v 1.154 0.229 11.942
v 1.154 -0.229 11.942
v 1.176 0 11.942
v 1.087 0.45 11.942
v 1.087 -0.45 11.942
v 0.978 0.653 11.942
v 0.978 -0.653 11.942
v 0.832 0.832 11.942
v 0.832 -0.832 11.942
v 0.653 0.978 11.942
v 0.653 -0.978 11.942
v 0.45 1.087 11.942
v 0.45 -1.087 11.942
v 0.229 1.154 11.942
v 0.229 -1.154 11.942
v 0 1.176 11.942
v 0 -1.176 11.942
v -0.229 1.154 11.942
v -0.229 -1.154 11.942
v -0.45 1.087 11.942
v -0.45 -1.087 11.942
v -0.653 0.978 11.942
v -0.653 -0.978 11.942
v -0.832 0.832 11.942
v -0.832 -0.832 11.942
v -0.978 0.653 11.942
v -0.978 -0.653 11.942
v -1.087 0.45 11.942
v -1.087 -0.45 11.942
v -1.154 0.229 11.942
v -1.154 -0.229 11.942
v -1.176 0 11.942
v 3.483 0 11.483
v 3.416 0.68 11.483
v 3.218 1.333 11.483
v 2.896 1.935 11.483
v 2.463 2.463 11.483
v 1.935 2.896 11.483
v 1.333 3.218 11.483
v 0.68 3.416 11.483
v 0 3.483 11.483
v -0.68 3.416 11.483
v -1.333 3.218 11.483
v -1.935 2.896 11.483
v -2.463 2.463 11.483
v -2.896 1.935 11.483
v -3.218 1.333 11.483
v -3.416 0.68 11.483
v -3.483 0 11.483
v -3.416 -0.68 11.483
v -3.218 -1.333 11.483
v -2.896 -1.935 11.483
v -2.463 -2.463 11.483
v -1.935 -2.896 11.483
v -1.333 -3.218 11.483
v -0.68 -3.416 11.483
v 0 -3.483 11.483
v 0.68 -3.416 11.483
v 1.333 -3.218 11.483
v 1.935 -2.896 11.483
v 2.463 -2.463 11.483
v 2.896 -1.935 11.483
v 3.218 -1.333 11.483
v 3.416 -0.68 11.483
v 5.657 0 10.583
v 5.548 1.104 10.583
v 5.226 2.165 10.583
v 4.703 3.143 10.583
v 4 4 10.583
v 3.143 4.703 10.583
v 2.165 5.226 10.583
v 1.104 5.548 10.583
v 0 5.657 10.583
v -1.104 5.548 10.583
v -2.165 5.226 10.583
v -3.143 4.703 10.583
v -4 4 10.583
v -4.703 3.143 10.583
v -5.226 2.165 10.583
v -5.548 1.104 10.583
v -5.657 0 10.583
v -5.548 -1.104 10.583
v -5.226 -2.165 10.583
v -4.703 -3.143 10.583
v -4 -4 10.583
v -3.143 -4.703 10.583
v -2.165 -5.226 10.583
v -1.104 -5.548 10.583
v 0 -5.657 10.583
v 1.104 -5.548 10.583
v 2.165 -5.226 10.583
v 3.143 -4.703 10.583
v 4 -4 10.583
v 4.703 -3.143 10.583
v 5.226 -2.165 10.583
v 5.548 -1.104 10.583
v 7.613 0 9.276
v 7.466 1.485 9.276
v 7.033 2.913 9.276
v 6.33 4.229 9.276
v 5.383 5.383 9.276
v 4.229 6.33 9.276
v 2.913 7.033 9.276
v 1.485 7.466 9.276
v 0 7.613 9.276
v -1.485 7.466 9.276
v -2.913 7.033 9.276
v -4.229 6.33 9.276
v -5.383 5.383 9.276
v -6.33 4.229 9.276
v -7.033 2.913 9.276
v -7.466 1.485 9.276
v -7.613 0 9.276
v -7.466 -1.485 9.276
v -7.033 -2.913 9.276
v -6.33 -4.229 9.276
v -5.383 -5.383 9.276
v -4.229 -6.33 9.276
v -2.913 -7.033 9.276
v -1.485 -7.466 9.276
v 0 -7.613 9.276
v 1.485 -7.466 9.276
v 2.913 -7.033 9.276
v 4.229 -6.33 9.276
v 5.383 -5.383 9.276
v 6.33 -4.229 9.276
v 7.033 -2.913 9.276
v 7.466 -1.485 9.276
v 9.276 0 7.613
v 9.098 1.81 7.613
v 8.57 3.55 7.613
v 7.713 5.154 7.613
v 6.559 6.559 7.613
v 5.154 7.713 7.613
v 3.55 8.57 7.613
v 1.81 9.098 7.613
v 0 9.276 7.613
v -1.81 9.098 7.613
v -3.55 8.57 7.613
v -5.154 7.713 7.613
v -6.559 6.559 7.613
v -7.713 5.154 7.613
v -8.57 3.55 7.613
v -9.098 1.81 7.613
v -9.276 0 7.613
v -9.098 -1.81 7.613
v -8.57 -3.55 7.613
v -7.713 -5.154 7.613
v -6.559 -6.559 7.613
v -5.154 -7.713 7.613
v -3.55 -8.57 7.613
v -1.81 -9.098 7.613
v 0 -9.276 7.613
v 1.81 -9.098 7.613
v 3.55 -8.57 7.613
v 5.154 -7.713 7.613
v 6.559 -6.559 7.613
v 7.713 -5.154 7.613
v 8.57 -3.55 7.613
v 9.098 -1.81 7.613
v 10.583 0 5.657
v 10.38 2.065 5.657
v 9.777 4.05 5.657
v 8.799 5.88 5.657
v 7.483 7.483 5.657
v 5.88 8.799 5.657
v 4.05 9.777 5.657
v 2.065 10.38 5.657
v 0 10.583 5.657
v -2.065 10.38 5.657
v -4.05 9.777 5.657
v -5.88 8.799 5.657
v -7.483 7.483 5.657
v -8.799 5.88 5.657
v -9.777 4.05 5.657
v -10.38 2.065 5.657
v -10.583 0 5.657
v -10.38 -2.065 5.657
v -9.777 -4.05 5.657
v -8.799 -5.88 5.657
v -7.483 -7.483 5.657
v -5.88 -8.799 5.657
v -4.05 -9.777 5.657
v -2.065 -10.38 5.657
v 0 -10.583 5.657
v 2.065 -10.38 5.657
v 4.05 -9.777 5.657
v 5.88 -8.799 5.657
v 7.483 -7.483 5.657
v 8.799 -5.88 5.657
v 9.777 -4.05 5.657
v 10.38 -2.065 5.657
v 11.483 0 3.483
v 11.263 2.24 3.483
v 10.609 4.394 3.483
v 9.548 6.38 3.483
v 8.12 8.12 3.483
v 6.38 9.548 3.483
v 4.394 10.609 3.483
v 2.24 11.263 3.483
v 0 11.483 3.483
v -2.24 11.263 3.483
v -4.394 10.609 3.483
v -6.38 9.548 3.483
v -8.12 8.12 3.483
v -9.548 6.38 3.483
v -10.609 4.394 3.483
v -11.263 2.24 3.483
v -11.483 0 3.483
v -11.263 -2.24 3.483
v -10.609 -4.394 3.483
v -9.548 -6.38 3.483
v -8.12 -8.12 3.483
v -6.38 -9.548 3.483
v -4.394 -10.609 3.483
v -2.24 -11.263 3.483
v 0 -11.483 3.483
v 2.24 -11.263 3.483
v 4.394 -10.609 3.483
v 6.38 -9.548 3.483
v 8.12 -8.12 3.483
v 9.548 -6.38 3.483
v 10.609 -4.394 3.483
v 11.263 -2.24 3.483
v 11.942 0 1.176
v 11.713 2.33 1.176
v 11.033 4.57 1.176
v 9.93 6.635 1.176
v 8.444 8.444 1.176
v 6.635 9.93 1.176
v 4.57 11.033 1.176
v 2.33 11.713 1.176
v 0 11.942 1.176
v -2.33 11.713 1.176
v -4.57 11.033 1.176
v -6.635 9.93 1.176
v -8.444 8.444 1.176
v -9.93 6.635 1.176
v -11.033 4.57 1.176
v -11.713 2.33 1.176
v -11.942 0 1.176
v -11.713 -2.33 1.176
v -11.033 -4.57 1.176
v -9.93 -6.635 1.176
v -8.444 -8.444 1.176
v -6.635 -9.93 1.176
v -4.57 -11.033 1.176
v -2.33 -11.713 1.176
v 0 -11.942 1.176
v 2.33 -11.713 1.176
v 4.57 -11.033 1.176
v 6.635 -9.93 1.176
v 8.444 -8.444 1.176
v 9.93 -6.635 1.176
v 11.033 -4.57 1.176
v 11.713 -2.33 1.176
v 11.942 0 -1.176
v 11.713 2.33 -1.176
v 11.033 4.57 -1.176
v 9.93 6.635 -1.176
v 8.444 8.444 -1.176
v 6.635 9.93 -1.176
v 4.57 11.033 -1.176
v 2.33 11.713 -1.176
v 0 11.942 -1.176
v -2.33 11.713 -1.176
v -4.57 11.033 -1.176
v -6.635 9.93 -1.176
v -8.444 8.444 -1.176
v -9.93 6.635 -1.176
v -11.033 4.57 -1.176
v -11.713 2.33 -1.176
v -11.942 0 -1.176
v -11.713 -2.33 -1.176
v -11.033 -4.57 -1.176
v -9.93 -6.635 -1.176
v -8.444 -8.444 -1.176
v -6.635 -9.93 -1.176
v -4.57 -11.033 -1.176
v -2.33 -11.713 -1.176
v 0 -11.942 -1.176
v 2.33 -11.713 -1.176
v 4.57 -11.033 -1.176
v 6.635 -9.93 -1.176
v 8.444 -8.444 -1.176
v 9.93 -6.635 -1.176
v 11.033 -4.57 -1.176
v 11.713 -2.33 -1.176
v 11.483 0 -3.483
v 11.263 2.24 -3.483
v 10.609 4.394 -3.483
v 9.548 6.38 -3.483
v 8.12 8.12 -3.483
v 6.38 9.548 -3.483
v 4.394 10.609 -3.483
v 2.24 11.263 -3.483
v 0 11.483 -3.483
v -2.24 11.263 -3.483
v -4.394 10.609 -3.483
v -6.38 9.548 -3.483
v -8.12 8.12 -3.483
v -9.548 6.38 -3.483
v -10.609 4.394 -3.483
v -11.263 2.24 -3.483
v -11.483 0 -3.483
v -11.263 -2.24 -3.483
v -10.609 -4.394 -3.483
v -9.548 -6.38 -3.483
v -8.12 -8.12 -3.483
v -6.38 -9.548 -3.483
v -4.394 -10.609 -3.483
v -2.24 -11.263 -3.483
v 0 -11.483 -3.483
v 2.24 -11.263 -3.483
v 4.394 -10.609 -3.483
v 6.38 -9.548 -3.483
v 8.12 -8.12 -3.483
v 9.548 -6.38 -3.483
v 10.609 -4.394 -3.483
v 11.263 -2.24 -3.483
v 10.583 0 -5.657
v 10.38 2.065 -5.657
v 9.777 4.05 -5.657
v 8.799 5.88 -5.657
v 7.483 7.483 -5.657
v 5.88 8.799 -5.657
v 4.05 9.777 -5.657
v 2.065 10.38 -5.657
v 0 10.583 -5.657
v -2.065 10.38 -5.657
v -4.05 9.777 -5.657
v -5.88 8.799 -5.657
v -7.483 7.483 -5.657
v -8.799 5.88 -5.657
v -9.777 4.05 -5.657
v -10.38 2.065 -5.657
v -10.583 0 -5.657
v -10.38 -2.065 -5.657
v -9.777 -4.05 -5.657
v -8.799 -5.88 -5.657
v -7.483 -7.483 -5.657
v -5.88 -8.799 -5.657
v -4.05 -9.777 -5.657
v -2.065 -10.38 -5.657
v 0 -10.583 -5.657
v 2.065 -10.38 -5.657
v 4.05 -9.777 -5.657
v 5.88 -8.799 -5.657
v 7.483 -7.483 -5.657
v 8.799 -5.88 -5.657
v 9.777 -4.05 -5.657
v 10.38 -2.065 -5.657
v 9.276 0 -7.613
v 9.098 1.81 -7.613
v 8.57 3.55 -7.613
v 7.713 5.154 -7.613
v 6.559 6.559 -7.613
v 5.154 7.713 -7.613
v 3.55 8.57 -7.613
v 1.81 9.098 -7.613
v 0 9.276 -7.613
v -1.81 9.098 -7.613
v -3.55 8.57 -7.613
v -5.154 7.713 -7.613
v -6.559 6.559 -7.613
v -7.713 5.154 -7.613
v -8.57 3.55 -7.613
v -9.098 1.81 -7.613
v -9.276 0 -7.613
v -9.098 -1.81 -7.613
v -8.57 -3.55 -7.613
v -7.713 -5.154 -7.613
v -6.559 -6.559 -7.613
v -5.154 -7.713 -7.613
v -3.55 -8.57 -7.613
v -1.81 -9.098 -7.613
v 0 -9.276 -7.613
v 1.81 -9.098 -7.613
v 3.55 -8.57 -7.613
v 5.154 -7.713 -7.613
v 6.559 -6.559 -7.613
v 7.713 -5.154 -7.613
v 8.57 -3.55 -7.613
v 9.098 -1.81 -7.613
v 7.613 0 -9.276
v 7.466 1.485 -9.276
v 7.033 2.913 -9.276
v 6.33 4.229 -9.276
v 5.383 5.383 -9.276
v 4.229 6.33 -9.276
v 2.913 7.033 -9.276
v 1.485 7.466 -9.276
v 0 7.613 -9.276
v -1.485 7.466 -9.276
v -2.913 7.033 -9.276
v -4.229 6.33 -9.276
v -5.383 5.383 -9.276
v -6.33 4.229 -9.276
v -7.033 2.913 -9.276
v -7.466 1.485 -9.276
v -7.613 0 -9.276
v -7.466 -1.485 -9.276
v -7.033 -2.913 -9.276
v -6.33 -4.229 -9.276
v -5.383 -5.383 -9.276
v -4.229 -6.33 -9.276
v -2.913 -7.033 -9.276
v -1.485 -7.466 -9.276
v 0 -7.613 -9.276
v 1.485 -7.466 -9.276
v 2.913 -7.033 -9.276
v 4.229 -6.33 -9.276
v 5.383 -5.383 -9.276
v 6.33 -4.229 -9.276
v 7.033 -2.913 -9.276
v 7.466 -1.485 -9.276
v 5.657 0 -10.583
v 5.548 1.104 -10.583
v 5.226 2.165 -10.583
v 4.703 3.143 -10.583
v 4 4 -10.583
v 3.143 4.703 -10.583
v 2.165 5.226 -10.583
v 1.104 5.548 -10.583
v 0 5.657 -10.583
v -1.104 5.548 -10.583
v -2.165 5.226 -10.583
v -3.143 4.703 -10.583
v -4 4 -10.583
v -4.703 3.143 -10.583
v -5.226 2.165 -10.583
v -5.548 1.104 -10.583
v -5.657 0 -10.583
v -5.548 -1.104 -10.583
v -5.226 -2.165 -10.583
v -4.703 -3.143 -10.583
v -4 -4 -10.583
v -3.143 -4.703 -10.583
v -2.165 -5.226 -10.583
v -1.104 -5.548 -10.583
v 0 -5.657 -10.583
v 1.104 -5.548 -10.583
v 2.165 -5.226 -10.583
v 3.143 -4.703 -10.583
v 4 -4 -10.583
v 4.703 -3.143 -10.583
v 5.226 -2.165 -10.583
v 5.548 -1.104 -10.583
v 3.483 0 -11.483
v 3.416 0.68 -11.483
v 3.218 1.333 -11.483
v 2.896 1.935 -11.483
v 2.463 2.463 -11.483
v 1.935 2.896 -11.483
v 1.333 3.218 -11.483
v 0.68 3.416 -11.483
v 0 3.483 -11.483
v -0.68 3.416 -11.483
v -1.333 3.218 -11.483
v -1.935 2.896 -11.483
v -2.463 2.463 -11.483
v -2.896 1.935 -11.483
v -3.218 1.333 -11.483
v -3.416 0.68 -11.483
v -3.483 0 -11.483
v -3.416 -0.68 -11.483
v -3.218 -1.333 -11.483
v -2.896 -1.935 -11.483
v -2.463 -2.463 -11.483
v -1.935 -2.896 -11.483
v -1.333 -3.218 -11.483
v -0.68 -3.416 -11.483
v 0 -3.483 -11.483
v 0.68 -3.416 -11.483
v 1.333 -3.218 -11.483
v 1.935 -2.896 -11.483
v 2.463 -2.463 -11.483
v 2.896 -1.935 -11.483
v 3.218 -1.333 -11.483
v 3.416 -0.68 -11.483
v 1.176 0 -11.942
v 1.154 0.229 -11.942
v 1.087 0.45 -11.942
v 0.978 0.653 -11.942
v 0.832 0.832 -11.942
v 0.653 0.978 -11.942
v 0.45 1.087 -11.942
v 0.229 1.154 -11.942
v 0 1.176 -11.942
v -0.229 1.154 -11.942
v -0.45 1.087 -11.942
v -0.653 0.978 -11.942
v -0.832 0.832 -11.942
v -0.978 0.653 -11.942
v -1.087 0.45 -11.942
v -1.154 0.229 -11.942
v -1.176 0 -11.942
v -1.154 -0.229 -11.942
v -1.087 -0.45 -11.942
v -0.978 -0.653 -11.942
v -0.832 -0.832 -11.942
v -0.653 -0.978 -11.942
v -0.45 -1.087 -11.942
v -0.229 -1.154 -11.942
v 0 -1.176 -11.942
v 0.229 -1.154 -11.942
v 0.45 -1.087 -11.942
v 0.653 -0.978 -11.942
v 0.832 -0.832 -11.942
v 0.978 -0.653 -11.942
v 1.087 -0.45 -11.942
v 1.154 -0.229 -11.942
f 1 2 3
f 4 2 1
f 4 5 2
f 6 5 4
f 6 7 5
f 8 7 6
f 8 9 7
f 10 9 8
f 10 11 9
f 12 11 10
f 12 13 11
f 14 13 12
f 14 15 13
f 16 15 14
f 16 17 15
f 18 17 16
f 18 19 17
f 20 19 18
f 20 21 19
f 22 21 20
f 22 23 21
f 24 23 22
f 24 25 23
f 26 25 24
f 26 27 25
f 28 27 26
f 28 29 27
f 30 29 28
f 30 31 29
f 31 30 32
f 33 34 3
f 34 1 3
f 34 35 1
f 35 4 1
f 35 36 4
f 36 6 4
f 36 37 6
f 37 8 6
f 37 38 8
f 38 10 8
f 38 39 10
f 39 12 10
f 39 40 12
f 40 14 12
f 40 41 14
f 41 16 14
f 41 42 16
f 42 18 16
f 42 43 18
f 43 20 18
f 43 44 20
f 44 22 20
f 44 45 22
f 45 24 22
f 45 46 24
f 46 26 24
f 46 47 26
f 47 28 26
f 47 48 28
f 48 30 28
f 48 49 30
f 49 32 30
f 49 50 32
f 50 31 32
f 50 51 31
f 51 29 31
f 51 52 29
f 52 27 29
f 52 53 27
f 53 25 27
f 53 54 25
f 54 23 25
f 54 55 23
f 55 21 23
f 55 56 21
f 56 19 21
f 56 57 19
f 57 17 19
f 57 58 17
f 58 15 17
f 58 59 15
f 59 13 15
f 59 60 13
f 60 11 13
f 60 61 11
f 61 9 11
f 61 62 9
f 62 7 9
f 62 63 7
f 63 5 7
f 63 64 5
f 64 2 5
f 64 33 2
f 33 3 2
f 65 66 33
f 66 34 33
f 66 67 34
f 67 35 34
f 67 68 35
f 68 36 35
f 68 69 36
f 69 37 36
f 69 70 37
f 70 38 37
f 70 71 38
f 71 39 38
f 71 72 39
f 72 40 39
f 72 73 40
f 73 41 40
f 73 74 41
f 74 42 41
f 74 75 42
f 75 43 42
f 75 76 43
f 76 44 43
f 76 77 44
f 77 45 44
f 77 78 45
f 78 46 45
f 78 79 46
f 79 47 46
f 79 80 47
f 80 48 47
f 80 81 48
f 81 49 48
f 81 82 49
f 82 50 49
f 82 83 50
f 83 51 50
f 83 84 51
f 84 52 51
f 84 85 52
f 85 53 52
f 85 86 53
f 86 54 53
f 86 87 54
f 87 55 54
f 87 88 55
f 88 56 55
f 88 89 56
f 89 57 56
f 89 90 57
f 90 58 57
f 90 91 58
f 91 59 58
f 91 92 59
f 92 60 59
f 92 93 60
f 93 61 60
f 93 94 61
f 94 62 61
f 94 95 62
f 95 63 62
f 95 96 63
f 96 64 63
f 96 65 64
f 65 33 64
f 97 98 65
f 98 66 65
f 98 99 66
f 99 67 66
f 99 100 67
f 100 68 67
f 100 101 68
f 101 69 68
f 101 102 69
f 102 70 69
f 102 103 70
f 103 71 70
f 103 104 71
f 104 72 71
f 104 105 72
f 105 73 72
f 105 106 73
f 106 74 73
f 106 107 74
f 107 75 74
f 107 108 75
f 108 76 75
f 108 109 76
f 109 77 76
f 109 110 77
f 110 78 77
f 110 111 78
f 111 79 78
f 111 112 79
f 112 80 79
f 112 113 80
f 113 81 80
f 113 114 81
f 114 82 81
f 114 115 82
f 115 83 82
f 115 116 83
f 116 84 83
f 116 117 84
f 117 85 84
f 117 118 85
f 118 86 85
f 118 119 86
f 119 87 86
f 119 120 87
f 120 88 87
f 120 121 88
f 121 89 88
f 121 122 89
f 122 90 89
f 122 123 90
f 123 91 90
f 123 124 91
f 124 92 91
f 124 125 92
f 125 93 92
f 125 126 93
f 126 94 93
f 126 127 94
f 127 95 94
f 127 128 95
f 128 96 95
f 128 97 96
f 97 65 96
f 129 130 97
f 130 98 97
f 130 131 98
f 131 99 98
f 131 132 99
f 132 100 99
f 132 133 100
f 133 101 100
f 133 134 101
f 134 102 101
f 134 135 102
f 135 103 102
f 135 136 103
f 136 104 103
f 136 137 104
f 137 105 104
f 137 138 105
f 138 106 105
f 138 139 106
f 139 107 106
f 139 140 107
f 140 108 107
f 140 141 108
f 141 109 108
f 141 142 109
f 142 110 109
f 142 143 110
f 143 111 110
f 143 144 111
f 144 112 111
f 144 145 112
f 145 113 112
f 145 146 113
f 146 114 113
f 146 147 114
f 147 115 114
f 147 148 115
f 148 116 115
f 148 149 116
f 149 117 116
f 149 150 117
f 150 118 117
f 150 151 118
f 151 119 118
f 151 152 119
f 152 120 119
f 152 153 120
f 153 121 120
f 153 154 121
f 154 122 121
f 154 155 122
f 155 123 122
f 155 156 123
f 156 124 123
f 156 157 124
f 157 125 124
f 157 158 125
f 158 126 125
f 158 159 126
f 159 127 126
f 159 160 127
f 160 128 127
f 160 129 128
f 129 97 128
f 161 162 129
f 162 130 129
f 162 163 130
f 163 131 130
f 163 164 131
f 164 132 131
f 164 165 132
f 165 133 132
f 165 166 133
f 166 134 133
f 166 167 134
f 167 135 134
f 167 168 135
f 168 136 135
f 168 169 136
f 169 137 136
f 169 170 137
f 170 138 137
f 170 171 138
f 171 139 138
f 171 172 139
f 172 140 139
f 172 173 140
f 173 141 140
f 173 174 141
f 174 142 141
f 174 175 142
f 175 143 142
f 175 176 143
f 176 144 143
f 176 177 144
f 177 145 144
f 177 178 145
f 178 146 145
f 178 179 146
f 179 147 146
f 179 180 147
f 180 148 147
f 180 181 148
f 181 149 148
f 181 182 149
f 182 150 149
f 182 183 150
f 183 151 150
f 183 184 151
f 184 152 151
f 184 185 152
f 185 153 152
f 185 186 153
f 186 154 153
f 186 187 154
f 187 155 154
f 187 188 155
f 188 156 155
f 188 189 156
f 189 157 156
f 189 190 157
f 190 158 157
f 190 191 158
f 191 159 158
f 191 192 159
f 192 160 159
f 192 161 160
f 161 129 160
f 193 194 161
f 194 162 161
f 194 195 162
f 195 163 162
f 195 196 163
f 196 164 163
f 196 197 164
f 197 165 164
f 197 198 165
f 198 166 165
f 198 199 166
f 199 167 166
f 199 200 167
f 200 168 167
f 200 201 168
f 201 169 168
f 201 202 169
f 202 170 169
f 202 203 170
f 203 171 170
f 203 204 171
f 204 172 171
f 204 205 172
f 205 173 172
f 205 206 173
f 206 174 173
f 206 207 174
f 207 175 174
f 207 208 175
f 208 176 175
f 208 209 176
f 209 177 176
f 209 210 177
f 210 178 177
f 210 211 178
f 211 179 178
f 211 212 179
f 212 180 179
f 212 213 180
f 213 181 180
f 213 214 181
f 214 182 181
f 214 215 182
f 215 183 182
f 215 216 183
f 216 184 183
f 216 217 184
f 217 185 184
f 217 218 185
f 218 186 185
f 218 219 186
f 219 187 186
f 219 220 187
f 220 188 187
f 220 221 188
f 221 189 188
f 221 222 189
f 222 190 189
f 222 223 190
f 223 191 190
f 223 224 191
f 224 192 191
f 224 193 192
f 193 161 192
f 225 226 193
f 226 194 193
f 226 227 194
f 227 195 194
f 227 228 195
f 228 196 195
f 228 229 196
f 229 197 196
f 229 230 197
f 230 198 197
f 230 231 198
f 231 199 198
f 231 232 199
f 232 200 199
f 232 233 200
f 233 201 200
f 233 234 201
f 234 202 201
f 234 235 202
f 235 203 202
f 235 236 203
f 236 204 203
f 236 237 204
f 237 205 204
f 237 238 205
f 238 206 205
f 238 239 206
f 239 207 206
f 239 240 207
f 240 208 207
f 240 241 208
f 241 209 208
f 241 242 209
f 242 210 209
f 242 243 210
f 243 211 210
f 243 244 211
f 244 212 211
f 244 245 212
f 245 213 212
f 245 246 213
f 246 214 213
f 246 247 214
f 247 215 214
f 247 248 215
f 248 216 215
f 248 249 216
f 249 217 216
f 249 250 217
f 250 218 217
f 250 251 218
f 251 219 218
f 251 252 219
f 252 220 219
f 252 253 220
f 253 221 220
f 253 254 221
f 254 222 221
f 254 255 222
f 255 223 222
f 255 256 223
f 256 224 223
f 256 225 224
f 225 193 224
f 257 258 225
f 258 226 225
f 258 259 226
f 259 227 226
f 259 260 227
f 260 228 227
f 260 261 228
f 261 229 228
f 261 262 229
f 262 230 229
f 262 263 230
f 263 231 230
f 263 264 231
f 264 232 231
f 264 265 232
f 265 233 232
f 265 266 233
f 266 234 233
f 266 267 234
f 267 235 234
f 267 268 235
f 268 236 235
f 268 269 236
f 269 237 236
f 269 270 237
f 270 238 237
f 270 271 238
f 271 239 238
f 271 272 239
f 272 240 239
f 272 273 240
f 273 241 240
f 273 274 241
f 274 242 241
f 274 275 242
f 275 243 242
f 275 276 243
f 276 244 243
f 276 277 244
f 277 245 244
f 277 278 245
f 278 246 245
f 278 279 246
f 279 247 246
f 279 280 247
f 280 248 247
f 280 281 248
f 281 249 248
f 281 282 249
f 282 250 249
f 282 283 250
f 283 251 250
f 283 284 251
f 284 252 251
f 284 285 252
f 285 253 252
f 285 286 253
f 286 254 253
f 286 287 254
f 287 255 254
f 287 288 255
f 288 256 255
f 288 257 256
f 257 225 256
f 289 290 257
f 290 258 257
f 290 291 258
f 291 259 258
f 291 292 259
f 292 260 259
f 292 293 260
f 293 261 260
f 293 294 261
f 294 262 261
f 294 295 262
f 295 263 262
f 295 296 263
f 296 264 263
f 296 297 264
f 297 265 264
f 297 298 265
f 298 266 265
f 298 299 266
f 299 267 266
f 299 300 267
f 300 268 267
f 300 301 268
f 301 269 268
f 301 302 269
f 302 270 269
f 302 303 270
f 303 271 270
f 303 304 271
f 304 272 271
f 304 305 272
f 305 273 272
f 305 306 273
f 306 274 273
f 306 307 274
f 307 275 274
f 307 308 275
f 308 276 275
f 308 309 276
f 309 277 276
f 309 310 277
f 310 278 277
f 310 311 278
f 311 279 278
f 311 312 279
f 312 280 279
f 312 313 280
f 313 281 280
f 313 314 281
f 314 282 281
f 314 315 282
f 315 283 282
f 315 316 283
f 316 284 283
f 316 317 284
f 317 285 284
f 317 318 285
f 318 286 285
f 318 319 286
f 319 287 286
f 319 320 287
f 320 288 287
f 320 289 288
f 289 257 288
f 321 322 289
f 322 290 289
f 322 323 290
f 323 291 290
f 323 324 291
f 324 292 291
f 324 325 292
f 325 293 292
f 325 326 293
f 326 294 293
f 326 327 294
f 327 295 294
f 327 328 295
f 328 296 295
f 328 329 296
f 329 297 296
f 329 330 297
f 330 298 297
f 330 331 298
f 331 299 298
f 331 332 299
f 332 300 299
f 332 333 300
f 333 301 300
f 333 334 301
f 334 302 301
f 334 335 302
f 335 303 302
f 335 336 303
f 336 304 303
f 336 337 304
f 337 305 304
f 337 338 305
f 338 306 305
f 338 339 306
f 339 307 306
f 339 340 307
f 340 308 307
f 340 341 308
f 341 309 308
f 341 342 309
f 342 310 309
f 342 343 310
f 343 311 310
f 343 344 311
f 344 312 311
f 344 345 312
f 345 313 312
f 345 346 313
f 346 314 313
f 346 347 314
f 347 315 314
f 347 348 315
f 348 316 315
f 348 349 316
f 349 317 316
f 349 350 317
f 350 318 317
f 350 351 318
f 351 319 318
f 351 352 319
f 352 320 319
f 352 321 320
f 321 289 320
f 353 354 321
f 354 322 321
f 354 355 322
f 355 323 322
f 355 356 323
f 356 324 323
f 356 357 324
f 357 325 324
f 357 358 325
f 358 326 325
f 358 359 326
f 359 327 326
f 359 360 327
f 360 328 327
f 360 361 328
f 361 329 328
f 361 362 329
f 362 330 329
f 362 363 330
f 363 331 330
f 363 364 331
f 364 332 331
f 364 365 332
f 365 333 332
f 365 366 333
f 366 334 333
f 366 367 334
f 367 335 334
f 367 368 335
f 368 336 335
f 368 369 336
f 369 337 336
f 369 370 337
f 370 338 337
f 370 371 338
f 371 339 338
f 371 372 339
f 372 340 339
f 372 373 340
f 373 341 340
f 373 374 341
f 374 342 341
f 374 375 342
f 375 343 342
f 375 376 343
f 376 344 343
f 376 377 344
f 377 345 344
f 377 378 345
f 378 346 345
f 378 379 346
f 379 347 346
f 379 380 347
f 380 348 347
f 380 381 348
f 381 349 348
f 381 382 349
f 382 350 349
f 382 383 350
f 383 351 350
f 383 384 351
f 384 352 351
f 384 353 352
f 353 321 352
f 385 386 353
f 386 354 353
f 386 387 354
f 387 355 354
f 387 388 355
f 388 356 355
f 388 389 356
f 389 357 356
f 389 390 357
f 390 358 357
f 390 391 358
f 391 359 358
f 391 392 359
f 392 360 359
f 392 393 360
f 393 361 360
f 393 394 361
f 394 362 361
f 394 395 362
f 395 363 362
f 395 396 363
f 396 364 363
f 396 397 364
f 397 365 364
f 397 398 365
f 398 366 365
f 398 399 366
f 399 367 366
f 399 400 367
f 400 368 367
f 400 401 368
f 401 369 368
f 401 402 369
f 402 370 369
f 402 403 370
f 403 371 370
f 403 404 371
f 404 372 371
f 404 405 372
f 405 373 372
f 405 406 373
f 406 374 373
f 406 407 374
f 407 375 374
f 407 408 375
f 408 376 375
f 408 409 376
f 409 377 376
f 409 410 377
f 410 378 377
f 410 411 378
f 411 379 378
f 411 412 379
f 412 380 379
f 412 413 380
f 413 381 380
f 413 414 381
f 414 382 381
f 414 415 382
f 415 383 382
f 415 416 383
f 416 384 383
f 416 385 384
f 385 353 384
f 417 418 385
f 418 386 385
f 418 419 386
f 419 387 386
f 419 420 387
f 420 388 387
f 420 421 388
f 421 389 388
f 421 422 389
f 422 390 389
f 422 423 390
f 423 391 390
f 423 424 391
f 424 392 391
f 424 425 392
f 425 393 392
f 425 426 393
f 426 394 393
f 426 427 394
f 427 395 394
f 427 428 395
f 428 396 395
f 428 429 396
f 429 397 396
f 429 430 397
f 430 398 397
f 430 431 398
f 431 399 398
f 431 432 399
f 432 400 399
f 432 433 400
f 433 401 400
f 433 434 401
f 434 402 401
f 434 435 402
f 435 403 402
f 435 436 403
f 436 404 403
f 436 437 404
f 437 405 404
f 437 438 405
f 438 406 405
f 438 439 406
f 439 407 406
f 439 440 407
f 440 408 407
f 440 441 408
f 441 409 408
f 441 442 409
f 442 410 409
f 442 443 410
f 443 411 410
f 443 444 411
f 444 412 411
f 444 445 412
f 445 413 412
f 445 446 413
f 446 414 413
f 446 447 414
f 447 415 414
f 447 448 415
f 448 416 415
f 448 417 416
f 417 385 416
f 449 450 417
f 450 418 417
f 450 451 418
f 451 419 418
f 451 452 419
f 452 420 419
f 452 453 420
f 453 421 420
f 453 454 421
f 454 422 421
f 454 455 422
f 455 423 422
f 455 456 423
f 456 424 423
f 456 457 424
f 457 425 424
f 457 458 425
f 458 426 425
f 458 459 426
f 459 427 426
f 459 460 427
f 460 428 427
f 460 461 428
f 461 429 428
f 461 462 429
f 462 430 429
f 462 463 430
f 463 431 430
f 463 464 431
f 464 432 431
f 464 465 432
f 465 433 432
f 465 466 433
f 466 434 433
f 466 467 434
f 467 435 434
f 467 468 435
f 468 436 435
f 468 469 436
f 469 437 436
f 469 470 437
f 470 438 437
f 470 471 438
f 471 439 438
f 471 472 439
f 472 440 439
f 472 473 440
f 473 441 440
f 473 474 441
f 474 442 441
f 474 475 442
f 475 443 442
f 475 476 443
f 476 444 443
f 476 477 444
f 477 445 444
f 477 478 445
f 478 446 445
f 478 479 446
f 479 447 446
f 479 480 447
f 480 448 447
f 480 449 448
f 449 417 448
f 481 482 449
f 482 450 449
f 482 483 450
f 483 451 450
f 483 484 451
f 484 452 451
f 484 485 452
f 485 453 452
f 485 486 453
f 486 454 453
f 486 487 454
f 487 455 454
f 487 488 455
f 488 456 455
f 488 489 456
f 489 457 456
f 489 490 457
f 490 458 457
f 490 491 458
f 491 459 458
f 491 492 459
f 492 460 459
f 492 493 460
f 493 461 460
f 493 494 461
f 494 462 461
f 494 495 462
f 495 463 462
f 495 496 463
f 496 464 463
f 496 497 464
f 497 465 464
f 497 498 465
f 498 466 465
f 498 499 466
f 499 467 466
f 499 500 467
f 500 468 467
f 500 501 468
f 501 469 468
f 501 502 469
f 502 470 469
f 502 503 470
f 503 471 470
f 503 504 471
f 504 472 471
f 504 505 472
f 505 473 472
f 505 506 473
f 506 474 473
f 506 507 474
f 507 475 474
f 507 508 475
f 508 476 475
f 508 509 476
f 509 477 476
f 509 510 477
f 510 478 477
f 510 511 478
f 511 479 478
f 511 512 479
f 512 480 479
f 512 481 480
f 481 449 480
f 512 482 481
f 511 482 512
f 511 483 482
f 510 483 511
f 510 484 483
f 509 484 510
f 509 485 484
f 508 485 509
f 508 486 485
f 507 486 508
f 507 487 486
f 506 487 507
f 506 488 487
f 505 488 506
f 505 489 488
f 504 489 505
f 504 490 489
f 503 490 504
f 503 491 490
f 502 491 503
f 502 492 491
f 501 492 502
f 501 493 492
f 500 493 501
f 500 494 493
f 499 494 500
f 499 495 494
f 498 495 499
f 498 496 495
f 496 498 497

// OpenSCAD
// Sphere rendering test
$fn = 32; // Smooth sphere

// Simple sphere
sphere(r=12);

// Note: This should now render as an actual sphere mesh
// instead of the basic cube from the old mock implementation
